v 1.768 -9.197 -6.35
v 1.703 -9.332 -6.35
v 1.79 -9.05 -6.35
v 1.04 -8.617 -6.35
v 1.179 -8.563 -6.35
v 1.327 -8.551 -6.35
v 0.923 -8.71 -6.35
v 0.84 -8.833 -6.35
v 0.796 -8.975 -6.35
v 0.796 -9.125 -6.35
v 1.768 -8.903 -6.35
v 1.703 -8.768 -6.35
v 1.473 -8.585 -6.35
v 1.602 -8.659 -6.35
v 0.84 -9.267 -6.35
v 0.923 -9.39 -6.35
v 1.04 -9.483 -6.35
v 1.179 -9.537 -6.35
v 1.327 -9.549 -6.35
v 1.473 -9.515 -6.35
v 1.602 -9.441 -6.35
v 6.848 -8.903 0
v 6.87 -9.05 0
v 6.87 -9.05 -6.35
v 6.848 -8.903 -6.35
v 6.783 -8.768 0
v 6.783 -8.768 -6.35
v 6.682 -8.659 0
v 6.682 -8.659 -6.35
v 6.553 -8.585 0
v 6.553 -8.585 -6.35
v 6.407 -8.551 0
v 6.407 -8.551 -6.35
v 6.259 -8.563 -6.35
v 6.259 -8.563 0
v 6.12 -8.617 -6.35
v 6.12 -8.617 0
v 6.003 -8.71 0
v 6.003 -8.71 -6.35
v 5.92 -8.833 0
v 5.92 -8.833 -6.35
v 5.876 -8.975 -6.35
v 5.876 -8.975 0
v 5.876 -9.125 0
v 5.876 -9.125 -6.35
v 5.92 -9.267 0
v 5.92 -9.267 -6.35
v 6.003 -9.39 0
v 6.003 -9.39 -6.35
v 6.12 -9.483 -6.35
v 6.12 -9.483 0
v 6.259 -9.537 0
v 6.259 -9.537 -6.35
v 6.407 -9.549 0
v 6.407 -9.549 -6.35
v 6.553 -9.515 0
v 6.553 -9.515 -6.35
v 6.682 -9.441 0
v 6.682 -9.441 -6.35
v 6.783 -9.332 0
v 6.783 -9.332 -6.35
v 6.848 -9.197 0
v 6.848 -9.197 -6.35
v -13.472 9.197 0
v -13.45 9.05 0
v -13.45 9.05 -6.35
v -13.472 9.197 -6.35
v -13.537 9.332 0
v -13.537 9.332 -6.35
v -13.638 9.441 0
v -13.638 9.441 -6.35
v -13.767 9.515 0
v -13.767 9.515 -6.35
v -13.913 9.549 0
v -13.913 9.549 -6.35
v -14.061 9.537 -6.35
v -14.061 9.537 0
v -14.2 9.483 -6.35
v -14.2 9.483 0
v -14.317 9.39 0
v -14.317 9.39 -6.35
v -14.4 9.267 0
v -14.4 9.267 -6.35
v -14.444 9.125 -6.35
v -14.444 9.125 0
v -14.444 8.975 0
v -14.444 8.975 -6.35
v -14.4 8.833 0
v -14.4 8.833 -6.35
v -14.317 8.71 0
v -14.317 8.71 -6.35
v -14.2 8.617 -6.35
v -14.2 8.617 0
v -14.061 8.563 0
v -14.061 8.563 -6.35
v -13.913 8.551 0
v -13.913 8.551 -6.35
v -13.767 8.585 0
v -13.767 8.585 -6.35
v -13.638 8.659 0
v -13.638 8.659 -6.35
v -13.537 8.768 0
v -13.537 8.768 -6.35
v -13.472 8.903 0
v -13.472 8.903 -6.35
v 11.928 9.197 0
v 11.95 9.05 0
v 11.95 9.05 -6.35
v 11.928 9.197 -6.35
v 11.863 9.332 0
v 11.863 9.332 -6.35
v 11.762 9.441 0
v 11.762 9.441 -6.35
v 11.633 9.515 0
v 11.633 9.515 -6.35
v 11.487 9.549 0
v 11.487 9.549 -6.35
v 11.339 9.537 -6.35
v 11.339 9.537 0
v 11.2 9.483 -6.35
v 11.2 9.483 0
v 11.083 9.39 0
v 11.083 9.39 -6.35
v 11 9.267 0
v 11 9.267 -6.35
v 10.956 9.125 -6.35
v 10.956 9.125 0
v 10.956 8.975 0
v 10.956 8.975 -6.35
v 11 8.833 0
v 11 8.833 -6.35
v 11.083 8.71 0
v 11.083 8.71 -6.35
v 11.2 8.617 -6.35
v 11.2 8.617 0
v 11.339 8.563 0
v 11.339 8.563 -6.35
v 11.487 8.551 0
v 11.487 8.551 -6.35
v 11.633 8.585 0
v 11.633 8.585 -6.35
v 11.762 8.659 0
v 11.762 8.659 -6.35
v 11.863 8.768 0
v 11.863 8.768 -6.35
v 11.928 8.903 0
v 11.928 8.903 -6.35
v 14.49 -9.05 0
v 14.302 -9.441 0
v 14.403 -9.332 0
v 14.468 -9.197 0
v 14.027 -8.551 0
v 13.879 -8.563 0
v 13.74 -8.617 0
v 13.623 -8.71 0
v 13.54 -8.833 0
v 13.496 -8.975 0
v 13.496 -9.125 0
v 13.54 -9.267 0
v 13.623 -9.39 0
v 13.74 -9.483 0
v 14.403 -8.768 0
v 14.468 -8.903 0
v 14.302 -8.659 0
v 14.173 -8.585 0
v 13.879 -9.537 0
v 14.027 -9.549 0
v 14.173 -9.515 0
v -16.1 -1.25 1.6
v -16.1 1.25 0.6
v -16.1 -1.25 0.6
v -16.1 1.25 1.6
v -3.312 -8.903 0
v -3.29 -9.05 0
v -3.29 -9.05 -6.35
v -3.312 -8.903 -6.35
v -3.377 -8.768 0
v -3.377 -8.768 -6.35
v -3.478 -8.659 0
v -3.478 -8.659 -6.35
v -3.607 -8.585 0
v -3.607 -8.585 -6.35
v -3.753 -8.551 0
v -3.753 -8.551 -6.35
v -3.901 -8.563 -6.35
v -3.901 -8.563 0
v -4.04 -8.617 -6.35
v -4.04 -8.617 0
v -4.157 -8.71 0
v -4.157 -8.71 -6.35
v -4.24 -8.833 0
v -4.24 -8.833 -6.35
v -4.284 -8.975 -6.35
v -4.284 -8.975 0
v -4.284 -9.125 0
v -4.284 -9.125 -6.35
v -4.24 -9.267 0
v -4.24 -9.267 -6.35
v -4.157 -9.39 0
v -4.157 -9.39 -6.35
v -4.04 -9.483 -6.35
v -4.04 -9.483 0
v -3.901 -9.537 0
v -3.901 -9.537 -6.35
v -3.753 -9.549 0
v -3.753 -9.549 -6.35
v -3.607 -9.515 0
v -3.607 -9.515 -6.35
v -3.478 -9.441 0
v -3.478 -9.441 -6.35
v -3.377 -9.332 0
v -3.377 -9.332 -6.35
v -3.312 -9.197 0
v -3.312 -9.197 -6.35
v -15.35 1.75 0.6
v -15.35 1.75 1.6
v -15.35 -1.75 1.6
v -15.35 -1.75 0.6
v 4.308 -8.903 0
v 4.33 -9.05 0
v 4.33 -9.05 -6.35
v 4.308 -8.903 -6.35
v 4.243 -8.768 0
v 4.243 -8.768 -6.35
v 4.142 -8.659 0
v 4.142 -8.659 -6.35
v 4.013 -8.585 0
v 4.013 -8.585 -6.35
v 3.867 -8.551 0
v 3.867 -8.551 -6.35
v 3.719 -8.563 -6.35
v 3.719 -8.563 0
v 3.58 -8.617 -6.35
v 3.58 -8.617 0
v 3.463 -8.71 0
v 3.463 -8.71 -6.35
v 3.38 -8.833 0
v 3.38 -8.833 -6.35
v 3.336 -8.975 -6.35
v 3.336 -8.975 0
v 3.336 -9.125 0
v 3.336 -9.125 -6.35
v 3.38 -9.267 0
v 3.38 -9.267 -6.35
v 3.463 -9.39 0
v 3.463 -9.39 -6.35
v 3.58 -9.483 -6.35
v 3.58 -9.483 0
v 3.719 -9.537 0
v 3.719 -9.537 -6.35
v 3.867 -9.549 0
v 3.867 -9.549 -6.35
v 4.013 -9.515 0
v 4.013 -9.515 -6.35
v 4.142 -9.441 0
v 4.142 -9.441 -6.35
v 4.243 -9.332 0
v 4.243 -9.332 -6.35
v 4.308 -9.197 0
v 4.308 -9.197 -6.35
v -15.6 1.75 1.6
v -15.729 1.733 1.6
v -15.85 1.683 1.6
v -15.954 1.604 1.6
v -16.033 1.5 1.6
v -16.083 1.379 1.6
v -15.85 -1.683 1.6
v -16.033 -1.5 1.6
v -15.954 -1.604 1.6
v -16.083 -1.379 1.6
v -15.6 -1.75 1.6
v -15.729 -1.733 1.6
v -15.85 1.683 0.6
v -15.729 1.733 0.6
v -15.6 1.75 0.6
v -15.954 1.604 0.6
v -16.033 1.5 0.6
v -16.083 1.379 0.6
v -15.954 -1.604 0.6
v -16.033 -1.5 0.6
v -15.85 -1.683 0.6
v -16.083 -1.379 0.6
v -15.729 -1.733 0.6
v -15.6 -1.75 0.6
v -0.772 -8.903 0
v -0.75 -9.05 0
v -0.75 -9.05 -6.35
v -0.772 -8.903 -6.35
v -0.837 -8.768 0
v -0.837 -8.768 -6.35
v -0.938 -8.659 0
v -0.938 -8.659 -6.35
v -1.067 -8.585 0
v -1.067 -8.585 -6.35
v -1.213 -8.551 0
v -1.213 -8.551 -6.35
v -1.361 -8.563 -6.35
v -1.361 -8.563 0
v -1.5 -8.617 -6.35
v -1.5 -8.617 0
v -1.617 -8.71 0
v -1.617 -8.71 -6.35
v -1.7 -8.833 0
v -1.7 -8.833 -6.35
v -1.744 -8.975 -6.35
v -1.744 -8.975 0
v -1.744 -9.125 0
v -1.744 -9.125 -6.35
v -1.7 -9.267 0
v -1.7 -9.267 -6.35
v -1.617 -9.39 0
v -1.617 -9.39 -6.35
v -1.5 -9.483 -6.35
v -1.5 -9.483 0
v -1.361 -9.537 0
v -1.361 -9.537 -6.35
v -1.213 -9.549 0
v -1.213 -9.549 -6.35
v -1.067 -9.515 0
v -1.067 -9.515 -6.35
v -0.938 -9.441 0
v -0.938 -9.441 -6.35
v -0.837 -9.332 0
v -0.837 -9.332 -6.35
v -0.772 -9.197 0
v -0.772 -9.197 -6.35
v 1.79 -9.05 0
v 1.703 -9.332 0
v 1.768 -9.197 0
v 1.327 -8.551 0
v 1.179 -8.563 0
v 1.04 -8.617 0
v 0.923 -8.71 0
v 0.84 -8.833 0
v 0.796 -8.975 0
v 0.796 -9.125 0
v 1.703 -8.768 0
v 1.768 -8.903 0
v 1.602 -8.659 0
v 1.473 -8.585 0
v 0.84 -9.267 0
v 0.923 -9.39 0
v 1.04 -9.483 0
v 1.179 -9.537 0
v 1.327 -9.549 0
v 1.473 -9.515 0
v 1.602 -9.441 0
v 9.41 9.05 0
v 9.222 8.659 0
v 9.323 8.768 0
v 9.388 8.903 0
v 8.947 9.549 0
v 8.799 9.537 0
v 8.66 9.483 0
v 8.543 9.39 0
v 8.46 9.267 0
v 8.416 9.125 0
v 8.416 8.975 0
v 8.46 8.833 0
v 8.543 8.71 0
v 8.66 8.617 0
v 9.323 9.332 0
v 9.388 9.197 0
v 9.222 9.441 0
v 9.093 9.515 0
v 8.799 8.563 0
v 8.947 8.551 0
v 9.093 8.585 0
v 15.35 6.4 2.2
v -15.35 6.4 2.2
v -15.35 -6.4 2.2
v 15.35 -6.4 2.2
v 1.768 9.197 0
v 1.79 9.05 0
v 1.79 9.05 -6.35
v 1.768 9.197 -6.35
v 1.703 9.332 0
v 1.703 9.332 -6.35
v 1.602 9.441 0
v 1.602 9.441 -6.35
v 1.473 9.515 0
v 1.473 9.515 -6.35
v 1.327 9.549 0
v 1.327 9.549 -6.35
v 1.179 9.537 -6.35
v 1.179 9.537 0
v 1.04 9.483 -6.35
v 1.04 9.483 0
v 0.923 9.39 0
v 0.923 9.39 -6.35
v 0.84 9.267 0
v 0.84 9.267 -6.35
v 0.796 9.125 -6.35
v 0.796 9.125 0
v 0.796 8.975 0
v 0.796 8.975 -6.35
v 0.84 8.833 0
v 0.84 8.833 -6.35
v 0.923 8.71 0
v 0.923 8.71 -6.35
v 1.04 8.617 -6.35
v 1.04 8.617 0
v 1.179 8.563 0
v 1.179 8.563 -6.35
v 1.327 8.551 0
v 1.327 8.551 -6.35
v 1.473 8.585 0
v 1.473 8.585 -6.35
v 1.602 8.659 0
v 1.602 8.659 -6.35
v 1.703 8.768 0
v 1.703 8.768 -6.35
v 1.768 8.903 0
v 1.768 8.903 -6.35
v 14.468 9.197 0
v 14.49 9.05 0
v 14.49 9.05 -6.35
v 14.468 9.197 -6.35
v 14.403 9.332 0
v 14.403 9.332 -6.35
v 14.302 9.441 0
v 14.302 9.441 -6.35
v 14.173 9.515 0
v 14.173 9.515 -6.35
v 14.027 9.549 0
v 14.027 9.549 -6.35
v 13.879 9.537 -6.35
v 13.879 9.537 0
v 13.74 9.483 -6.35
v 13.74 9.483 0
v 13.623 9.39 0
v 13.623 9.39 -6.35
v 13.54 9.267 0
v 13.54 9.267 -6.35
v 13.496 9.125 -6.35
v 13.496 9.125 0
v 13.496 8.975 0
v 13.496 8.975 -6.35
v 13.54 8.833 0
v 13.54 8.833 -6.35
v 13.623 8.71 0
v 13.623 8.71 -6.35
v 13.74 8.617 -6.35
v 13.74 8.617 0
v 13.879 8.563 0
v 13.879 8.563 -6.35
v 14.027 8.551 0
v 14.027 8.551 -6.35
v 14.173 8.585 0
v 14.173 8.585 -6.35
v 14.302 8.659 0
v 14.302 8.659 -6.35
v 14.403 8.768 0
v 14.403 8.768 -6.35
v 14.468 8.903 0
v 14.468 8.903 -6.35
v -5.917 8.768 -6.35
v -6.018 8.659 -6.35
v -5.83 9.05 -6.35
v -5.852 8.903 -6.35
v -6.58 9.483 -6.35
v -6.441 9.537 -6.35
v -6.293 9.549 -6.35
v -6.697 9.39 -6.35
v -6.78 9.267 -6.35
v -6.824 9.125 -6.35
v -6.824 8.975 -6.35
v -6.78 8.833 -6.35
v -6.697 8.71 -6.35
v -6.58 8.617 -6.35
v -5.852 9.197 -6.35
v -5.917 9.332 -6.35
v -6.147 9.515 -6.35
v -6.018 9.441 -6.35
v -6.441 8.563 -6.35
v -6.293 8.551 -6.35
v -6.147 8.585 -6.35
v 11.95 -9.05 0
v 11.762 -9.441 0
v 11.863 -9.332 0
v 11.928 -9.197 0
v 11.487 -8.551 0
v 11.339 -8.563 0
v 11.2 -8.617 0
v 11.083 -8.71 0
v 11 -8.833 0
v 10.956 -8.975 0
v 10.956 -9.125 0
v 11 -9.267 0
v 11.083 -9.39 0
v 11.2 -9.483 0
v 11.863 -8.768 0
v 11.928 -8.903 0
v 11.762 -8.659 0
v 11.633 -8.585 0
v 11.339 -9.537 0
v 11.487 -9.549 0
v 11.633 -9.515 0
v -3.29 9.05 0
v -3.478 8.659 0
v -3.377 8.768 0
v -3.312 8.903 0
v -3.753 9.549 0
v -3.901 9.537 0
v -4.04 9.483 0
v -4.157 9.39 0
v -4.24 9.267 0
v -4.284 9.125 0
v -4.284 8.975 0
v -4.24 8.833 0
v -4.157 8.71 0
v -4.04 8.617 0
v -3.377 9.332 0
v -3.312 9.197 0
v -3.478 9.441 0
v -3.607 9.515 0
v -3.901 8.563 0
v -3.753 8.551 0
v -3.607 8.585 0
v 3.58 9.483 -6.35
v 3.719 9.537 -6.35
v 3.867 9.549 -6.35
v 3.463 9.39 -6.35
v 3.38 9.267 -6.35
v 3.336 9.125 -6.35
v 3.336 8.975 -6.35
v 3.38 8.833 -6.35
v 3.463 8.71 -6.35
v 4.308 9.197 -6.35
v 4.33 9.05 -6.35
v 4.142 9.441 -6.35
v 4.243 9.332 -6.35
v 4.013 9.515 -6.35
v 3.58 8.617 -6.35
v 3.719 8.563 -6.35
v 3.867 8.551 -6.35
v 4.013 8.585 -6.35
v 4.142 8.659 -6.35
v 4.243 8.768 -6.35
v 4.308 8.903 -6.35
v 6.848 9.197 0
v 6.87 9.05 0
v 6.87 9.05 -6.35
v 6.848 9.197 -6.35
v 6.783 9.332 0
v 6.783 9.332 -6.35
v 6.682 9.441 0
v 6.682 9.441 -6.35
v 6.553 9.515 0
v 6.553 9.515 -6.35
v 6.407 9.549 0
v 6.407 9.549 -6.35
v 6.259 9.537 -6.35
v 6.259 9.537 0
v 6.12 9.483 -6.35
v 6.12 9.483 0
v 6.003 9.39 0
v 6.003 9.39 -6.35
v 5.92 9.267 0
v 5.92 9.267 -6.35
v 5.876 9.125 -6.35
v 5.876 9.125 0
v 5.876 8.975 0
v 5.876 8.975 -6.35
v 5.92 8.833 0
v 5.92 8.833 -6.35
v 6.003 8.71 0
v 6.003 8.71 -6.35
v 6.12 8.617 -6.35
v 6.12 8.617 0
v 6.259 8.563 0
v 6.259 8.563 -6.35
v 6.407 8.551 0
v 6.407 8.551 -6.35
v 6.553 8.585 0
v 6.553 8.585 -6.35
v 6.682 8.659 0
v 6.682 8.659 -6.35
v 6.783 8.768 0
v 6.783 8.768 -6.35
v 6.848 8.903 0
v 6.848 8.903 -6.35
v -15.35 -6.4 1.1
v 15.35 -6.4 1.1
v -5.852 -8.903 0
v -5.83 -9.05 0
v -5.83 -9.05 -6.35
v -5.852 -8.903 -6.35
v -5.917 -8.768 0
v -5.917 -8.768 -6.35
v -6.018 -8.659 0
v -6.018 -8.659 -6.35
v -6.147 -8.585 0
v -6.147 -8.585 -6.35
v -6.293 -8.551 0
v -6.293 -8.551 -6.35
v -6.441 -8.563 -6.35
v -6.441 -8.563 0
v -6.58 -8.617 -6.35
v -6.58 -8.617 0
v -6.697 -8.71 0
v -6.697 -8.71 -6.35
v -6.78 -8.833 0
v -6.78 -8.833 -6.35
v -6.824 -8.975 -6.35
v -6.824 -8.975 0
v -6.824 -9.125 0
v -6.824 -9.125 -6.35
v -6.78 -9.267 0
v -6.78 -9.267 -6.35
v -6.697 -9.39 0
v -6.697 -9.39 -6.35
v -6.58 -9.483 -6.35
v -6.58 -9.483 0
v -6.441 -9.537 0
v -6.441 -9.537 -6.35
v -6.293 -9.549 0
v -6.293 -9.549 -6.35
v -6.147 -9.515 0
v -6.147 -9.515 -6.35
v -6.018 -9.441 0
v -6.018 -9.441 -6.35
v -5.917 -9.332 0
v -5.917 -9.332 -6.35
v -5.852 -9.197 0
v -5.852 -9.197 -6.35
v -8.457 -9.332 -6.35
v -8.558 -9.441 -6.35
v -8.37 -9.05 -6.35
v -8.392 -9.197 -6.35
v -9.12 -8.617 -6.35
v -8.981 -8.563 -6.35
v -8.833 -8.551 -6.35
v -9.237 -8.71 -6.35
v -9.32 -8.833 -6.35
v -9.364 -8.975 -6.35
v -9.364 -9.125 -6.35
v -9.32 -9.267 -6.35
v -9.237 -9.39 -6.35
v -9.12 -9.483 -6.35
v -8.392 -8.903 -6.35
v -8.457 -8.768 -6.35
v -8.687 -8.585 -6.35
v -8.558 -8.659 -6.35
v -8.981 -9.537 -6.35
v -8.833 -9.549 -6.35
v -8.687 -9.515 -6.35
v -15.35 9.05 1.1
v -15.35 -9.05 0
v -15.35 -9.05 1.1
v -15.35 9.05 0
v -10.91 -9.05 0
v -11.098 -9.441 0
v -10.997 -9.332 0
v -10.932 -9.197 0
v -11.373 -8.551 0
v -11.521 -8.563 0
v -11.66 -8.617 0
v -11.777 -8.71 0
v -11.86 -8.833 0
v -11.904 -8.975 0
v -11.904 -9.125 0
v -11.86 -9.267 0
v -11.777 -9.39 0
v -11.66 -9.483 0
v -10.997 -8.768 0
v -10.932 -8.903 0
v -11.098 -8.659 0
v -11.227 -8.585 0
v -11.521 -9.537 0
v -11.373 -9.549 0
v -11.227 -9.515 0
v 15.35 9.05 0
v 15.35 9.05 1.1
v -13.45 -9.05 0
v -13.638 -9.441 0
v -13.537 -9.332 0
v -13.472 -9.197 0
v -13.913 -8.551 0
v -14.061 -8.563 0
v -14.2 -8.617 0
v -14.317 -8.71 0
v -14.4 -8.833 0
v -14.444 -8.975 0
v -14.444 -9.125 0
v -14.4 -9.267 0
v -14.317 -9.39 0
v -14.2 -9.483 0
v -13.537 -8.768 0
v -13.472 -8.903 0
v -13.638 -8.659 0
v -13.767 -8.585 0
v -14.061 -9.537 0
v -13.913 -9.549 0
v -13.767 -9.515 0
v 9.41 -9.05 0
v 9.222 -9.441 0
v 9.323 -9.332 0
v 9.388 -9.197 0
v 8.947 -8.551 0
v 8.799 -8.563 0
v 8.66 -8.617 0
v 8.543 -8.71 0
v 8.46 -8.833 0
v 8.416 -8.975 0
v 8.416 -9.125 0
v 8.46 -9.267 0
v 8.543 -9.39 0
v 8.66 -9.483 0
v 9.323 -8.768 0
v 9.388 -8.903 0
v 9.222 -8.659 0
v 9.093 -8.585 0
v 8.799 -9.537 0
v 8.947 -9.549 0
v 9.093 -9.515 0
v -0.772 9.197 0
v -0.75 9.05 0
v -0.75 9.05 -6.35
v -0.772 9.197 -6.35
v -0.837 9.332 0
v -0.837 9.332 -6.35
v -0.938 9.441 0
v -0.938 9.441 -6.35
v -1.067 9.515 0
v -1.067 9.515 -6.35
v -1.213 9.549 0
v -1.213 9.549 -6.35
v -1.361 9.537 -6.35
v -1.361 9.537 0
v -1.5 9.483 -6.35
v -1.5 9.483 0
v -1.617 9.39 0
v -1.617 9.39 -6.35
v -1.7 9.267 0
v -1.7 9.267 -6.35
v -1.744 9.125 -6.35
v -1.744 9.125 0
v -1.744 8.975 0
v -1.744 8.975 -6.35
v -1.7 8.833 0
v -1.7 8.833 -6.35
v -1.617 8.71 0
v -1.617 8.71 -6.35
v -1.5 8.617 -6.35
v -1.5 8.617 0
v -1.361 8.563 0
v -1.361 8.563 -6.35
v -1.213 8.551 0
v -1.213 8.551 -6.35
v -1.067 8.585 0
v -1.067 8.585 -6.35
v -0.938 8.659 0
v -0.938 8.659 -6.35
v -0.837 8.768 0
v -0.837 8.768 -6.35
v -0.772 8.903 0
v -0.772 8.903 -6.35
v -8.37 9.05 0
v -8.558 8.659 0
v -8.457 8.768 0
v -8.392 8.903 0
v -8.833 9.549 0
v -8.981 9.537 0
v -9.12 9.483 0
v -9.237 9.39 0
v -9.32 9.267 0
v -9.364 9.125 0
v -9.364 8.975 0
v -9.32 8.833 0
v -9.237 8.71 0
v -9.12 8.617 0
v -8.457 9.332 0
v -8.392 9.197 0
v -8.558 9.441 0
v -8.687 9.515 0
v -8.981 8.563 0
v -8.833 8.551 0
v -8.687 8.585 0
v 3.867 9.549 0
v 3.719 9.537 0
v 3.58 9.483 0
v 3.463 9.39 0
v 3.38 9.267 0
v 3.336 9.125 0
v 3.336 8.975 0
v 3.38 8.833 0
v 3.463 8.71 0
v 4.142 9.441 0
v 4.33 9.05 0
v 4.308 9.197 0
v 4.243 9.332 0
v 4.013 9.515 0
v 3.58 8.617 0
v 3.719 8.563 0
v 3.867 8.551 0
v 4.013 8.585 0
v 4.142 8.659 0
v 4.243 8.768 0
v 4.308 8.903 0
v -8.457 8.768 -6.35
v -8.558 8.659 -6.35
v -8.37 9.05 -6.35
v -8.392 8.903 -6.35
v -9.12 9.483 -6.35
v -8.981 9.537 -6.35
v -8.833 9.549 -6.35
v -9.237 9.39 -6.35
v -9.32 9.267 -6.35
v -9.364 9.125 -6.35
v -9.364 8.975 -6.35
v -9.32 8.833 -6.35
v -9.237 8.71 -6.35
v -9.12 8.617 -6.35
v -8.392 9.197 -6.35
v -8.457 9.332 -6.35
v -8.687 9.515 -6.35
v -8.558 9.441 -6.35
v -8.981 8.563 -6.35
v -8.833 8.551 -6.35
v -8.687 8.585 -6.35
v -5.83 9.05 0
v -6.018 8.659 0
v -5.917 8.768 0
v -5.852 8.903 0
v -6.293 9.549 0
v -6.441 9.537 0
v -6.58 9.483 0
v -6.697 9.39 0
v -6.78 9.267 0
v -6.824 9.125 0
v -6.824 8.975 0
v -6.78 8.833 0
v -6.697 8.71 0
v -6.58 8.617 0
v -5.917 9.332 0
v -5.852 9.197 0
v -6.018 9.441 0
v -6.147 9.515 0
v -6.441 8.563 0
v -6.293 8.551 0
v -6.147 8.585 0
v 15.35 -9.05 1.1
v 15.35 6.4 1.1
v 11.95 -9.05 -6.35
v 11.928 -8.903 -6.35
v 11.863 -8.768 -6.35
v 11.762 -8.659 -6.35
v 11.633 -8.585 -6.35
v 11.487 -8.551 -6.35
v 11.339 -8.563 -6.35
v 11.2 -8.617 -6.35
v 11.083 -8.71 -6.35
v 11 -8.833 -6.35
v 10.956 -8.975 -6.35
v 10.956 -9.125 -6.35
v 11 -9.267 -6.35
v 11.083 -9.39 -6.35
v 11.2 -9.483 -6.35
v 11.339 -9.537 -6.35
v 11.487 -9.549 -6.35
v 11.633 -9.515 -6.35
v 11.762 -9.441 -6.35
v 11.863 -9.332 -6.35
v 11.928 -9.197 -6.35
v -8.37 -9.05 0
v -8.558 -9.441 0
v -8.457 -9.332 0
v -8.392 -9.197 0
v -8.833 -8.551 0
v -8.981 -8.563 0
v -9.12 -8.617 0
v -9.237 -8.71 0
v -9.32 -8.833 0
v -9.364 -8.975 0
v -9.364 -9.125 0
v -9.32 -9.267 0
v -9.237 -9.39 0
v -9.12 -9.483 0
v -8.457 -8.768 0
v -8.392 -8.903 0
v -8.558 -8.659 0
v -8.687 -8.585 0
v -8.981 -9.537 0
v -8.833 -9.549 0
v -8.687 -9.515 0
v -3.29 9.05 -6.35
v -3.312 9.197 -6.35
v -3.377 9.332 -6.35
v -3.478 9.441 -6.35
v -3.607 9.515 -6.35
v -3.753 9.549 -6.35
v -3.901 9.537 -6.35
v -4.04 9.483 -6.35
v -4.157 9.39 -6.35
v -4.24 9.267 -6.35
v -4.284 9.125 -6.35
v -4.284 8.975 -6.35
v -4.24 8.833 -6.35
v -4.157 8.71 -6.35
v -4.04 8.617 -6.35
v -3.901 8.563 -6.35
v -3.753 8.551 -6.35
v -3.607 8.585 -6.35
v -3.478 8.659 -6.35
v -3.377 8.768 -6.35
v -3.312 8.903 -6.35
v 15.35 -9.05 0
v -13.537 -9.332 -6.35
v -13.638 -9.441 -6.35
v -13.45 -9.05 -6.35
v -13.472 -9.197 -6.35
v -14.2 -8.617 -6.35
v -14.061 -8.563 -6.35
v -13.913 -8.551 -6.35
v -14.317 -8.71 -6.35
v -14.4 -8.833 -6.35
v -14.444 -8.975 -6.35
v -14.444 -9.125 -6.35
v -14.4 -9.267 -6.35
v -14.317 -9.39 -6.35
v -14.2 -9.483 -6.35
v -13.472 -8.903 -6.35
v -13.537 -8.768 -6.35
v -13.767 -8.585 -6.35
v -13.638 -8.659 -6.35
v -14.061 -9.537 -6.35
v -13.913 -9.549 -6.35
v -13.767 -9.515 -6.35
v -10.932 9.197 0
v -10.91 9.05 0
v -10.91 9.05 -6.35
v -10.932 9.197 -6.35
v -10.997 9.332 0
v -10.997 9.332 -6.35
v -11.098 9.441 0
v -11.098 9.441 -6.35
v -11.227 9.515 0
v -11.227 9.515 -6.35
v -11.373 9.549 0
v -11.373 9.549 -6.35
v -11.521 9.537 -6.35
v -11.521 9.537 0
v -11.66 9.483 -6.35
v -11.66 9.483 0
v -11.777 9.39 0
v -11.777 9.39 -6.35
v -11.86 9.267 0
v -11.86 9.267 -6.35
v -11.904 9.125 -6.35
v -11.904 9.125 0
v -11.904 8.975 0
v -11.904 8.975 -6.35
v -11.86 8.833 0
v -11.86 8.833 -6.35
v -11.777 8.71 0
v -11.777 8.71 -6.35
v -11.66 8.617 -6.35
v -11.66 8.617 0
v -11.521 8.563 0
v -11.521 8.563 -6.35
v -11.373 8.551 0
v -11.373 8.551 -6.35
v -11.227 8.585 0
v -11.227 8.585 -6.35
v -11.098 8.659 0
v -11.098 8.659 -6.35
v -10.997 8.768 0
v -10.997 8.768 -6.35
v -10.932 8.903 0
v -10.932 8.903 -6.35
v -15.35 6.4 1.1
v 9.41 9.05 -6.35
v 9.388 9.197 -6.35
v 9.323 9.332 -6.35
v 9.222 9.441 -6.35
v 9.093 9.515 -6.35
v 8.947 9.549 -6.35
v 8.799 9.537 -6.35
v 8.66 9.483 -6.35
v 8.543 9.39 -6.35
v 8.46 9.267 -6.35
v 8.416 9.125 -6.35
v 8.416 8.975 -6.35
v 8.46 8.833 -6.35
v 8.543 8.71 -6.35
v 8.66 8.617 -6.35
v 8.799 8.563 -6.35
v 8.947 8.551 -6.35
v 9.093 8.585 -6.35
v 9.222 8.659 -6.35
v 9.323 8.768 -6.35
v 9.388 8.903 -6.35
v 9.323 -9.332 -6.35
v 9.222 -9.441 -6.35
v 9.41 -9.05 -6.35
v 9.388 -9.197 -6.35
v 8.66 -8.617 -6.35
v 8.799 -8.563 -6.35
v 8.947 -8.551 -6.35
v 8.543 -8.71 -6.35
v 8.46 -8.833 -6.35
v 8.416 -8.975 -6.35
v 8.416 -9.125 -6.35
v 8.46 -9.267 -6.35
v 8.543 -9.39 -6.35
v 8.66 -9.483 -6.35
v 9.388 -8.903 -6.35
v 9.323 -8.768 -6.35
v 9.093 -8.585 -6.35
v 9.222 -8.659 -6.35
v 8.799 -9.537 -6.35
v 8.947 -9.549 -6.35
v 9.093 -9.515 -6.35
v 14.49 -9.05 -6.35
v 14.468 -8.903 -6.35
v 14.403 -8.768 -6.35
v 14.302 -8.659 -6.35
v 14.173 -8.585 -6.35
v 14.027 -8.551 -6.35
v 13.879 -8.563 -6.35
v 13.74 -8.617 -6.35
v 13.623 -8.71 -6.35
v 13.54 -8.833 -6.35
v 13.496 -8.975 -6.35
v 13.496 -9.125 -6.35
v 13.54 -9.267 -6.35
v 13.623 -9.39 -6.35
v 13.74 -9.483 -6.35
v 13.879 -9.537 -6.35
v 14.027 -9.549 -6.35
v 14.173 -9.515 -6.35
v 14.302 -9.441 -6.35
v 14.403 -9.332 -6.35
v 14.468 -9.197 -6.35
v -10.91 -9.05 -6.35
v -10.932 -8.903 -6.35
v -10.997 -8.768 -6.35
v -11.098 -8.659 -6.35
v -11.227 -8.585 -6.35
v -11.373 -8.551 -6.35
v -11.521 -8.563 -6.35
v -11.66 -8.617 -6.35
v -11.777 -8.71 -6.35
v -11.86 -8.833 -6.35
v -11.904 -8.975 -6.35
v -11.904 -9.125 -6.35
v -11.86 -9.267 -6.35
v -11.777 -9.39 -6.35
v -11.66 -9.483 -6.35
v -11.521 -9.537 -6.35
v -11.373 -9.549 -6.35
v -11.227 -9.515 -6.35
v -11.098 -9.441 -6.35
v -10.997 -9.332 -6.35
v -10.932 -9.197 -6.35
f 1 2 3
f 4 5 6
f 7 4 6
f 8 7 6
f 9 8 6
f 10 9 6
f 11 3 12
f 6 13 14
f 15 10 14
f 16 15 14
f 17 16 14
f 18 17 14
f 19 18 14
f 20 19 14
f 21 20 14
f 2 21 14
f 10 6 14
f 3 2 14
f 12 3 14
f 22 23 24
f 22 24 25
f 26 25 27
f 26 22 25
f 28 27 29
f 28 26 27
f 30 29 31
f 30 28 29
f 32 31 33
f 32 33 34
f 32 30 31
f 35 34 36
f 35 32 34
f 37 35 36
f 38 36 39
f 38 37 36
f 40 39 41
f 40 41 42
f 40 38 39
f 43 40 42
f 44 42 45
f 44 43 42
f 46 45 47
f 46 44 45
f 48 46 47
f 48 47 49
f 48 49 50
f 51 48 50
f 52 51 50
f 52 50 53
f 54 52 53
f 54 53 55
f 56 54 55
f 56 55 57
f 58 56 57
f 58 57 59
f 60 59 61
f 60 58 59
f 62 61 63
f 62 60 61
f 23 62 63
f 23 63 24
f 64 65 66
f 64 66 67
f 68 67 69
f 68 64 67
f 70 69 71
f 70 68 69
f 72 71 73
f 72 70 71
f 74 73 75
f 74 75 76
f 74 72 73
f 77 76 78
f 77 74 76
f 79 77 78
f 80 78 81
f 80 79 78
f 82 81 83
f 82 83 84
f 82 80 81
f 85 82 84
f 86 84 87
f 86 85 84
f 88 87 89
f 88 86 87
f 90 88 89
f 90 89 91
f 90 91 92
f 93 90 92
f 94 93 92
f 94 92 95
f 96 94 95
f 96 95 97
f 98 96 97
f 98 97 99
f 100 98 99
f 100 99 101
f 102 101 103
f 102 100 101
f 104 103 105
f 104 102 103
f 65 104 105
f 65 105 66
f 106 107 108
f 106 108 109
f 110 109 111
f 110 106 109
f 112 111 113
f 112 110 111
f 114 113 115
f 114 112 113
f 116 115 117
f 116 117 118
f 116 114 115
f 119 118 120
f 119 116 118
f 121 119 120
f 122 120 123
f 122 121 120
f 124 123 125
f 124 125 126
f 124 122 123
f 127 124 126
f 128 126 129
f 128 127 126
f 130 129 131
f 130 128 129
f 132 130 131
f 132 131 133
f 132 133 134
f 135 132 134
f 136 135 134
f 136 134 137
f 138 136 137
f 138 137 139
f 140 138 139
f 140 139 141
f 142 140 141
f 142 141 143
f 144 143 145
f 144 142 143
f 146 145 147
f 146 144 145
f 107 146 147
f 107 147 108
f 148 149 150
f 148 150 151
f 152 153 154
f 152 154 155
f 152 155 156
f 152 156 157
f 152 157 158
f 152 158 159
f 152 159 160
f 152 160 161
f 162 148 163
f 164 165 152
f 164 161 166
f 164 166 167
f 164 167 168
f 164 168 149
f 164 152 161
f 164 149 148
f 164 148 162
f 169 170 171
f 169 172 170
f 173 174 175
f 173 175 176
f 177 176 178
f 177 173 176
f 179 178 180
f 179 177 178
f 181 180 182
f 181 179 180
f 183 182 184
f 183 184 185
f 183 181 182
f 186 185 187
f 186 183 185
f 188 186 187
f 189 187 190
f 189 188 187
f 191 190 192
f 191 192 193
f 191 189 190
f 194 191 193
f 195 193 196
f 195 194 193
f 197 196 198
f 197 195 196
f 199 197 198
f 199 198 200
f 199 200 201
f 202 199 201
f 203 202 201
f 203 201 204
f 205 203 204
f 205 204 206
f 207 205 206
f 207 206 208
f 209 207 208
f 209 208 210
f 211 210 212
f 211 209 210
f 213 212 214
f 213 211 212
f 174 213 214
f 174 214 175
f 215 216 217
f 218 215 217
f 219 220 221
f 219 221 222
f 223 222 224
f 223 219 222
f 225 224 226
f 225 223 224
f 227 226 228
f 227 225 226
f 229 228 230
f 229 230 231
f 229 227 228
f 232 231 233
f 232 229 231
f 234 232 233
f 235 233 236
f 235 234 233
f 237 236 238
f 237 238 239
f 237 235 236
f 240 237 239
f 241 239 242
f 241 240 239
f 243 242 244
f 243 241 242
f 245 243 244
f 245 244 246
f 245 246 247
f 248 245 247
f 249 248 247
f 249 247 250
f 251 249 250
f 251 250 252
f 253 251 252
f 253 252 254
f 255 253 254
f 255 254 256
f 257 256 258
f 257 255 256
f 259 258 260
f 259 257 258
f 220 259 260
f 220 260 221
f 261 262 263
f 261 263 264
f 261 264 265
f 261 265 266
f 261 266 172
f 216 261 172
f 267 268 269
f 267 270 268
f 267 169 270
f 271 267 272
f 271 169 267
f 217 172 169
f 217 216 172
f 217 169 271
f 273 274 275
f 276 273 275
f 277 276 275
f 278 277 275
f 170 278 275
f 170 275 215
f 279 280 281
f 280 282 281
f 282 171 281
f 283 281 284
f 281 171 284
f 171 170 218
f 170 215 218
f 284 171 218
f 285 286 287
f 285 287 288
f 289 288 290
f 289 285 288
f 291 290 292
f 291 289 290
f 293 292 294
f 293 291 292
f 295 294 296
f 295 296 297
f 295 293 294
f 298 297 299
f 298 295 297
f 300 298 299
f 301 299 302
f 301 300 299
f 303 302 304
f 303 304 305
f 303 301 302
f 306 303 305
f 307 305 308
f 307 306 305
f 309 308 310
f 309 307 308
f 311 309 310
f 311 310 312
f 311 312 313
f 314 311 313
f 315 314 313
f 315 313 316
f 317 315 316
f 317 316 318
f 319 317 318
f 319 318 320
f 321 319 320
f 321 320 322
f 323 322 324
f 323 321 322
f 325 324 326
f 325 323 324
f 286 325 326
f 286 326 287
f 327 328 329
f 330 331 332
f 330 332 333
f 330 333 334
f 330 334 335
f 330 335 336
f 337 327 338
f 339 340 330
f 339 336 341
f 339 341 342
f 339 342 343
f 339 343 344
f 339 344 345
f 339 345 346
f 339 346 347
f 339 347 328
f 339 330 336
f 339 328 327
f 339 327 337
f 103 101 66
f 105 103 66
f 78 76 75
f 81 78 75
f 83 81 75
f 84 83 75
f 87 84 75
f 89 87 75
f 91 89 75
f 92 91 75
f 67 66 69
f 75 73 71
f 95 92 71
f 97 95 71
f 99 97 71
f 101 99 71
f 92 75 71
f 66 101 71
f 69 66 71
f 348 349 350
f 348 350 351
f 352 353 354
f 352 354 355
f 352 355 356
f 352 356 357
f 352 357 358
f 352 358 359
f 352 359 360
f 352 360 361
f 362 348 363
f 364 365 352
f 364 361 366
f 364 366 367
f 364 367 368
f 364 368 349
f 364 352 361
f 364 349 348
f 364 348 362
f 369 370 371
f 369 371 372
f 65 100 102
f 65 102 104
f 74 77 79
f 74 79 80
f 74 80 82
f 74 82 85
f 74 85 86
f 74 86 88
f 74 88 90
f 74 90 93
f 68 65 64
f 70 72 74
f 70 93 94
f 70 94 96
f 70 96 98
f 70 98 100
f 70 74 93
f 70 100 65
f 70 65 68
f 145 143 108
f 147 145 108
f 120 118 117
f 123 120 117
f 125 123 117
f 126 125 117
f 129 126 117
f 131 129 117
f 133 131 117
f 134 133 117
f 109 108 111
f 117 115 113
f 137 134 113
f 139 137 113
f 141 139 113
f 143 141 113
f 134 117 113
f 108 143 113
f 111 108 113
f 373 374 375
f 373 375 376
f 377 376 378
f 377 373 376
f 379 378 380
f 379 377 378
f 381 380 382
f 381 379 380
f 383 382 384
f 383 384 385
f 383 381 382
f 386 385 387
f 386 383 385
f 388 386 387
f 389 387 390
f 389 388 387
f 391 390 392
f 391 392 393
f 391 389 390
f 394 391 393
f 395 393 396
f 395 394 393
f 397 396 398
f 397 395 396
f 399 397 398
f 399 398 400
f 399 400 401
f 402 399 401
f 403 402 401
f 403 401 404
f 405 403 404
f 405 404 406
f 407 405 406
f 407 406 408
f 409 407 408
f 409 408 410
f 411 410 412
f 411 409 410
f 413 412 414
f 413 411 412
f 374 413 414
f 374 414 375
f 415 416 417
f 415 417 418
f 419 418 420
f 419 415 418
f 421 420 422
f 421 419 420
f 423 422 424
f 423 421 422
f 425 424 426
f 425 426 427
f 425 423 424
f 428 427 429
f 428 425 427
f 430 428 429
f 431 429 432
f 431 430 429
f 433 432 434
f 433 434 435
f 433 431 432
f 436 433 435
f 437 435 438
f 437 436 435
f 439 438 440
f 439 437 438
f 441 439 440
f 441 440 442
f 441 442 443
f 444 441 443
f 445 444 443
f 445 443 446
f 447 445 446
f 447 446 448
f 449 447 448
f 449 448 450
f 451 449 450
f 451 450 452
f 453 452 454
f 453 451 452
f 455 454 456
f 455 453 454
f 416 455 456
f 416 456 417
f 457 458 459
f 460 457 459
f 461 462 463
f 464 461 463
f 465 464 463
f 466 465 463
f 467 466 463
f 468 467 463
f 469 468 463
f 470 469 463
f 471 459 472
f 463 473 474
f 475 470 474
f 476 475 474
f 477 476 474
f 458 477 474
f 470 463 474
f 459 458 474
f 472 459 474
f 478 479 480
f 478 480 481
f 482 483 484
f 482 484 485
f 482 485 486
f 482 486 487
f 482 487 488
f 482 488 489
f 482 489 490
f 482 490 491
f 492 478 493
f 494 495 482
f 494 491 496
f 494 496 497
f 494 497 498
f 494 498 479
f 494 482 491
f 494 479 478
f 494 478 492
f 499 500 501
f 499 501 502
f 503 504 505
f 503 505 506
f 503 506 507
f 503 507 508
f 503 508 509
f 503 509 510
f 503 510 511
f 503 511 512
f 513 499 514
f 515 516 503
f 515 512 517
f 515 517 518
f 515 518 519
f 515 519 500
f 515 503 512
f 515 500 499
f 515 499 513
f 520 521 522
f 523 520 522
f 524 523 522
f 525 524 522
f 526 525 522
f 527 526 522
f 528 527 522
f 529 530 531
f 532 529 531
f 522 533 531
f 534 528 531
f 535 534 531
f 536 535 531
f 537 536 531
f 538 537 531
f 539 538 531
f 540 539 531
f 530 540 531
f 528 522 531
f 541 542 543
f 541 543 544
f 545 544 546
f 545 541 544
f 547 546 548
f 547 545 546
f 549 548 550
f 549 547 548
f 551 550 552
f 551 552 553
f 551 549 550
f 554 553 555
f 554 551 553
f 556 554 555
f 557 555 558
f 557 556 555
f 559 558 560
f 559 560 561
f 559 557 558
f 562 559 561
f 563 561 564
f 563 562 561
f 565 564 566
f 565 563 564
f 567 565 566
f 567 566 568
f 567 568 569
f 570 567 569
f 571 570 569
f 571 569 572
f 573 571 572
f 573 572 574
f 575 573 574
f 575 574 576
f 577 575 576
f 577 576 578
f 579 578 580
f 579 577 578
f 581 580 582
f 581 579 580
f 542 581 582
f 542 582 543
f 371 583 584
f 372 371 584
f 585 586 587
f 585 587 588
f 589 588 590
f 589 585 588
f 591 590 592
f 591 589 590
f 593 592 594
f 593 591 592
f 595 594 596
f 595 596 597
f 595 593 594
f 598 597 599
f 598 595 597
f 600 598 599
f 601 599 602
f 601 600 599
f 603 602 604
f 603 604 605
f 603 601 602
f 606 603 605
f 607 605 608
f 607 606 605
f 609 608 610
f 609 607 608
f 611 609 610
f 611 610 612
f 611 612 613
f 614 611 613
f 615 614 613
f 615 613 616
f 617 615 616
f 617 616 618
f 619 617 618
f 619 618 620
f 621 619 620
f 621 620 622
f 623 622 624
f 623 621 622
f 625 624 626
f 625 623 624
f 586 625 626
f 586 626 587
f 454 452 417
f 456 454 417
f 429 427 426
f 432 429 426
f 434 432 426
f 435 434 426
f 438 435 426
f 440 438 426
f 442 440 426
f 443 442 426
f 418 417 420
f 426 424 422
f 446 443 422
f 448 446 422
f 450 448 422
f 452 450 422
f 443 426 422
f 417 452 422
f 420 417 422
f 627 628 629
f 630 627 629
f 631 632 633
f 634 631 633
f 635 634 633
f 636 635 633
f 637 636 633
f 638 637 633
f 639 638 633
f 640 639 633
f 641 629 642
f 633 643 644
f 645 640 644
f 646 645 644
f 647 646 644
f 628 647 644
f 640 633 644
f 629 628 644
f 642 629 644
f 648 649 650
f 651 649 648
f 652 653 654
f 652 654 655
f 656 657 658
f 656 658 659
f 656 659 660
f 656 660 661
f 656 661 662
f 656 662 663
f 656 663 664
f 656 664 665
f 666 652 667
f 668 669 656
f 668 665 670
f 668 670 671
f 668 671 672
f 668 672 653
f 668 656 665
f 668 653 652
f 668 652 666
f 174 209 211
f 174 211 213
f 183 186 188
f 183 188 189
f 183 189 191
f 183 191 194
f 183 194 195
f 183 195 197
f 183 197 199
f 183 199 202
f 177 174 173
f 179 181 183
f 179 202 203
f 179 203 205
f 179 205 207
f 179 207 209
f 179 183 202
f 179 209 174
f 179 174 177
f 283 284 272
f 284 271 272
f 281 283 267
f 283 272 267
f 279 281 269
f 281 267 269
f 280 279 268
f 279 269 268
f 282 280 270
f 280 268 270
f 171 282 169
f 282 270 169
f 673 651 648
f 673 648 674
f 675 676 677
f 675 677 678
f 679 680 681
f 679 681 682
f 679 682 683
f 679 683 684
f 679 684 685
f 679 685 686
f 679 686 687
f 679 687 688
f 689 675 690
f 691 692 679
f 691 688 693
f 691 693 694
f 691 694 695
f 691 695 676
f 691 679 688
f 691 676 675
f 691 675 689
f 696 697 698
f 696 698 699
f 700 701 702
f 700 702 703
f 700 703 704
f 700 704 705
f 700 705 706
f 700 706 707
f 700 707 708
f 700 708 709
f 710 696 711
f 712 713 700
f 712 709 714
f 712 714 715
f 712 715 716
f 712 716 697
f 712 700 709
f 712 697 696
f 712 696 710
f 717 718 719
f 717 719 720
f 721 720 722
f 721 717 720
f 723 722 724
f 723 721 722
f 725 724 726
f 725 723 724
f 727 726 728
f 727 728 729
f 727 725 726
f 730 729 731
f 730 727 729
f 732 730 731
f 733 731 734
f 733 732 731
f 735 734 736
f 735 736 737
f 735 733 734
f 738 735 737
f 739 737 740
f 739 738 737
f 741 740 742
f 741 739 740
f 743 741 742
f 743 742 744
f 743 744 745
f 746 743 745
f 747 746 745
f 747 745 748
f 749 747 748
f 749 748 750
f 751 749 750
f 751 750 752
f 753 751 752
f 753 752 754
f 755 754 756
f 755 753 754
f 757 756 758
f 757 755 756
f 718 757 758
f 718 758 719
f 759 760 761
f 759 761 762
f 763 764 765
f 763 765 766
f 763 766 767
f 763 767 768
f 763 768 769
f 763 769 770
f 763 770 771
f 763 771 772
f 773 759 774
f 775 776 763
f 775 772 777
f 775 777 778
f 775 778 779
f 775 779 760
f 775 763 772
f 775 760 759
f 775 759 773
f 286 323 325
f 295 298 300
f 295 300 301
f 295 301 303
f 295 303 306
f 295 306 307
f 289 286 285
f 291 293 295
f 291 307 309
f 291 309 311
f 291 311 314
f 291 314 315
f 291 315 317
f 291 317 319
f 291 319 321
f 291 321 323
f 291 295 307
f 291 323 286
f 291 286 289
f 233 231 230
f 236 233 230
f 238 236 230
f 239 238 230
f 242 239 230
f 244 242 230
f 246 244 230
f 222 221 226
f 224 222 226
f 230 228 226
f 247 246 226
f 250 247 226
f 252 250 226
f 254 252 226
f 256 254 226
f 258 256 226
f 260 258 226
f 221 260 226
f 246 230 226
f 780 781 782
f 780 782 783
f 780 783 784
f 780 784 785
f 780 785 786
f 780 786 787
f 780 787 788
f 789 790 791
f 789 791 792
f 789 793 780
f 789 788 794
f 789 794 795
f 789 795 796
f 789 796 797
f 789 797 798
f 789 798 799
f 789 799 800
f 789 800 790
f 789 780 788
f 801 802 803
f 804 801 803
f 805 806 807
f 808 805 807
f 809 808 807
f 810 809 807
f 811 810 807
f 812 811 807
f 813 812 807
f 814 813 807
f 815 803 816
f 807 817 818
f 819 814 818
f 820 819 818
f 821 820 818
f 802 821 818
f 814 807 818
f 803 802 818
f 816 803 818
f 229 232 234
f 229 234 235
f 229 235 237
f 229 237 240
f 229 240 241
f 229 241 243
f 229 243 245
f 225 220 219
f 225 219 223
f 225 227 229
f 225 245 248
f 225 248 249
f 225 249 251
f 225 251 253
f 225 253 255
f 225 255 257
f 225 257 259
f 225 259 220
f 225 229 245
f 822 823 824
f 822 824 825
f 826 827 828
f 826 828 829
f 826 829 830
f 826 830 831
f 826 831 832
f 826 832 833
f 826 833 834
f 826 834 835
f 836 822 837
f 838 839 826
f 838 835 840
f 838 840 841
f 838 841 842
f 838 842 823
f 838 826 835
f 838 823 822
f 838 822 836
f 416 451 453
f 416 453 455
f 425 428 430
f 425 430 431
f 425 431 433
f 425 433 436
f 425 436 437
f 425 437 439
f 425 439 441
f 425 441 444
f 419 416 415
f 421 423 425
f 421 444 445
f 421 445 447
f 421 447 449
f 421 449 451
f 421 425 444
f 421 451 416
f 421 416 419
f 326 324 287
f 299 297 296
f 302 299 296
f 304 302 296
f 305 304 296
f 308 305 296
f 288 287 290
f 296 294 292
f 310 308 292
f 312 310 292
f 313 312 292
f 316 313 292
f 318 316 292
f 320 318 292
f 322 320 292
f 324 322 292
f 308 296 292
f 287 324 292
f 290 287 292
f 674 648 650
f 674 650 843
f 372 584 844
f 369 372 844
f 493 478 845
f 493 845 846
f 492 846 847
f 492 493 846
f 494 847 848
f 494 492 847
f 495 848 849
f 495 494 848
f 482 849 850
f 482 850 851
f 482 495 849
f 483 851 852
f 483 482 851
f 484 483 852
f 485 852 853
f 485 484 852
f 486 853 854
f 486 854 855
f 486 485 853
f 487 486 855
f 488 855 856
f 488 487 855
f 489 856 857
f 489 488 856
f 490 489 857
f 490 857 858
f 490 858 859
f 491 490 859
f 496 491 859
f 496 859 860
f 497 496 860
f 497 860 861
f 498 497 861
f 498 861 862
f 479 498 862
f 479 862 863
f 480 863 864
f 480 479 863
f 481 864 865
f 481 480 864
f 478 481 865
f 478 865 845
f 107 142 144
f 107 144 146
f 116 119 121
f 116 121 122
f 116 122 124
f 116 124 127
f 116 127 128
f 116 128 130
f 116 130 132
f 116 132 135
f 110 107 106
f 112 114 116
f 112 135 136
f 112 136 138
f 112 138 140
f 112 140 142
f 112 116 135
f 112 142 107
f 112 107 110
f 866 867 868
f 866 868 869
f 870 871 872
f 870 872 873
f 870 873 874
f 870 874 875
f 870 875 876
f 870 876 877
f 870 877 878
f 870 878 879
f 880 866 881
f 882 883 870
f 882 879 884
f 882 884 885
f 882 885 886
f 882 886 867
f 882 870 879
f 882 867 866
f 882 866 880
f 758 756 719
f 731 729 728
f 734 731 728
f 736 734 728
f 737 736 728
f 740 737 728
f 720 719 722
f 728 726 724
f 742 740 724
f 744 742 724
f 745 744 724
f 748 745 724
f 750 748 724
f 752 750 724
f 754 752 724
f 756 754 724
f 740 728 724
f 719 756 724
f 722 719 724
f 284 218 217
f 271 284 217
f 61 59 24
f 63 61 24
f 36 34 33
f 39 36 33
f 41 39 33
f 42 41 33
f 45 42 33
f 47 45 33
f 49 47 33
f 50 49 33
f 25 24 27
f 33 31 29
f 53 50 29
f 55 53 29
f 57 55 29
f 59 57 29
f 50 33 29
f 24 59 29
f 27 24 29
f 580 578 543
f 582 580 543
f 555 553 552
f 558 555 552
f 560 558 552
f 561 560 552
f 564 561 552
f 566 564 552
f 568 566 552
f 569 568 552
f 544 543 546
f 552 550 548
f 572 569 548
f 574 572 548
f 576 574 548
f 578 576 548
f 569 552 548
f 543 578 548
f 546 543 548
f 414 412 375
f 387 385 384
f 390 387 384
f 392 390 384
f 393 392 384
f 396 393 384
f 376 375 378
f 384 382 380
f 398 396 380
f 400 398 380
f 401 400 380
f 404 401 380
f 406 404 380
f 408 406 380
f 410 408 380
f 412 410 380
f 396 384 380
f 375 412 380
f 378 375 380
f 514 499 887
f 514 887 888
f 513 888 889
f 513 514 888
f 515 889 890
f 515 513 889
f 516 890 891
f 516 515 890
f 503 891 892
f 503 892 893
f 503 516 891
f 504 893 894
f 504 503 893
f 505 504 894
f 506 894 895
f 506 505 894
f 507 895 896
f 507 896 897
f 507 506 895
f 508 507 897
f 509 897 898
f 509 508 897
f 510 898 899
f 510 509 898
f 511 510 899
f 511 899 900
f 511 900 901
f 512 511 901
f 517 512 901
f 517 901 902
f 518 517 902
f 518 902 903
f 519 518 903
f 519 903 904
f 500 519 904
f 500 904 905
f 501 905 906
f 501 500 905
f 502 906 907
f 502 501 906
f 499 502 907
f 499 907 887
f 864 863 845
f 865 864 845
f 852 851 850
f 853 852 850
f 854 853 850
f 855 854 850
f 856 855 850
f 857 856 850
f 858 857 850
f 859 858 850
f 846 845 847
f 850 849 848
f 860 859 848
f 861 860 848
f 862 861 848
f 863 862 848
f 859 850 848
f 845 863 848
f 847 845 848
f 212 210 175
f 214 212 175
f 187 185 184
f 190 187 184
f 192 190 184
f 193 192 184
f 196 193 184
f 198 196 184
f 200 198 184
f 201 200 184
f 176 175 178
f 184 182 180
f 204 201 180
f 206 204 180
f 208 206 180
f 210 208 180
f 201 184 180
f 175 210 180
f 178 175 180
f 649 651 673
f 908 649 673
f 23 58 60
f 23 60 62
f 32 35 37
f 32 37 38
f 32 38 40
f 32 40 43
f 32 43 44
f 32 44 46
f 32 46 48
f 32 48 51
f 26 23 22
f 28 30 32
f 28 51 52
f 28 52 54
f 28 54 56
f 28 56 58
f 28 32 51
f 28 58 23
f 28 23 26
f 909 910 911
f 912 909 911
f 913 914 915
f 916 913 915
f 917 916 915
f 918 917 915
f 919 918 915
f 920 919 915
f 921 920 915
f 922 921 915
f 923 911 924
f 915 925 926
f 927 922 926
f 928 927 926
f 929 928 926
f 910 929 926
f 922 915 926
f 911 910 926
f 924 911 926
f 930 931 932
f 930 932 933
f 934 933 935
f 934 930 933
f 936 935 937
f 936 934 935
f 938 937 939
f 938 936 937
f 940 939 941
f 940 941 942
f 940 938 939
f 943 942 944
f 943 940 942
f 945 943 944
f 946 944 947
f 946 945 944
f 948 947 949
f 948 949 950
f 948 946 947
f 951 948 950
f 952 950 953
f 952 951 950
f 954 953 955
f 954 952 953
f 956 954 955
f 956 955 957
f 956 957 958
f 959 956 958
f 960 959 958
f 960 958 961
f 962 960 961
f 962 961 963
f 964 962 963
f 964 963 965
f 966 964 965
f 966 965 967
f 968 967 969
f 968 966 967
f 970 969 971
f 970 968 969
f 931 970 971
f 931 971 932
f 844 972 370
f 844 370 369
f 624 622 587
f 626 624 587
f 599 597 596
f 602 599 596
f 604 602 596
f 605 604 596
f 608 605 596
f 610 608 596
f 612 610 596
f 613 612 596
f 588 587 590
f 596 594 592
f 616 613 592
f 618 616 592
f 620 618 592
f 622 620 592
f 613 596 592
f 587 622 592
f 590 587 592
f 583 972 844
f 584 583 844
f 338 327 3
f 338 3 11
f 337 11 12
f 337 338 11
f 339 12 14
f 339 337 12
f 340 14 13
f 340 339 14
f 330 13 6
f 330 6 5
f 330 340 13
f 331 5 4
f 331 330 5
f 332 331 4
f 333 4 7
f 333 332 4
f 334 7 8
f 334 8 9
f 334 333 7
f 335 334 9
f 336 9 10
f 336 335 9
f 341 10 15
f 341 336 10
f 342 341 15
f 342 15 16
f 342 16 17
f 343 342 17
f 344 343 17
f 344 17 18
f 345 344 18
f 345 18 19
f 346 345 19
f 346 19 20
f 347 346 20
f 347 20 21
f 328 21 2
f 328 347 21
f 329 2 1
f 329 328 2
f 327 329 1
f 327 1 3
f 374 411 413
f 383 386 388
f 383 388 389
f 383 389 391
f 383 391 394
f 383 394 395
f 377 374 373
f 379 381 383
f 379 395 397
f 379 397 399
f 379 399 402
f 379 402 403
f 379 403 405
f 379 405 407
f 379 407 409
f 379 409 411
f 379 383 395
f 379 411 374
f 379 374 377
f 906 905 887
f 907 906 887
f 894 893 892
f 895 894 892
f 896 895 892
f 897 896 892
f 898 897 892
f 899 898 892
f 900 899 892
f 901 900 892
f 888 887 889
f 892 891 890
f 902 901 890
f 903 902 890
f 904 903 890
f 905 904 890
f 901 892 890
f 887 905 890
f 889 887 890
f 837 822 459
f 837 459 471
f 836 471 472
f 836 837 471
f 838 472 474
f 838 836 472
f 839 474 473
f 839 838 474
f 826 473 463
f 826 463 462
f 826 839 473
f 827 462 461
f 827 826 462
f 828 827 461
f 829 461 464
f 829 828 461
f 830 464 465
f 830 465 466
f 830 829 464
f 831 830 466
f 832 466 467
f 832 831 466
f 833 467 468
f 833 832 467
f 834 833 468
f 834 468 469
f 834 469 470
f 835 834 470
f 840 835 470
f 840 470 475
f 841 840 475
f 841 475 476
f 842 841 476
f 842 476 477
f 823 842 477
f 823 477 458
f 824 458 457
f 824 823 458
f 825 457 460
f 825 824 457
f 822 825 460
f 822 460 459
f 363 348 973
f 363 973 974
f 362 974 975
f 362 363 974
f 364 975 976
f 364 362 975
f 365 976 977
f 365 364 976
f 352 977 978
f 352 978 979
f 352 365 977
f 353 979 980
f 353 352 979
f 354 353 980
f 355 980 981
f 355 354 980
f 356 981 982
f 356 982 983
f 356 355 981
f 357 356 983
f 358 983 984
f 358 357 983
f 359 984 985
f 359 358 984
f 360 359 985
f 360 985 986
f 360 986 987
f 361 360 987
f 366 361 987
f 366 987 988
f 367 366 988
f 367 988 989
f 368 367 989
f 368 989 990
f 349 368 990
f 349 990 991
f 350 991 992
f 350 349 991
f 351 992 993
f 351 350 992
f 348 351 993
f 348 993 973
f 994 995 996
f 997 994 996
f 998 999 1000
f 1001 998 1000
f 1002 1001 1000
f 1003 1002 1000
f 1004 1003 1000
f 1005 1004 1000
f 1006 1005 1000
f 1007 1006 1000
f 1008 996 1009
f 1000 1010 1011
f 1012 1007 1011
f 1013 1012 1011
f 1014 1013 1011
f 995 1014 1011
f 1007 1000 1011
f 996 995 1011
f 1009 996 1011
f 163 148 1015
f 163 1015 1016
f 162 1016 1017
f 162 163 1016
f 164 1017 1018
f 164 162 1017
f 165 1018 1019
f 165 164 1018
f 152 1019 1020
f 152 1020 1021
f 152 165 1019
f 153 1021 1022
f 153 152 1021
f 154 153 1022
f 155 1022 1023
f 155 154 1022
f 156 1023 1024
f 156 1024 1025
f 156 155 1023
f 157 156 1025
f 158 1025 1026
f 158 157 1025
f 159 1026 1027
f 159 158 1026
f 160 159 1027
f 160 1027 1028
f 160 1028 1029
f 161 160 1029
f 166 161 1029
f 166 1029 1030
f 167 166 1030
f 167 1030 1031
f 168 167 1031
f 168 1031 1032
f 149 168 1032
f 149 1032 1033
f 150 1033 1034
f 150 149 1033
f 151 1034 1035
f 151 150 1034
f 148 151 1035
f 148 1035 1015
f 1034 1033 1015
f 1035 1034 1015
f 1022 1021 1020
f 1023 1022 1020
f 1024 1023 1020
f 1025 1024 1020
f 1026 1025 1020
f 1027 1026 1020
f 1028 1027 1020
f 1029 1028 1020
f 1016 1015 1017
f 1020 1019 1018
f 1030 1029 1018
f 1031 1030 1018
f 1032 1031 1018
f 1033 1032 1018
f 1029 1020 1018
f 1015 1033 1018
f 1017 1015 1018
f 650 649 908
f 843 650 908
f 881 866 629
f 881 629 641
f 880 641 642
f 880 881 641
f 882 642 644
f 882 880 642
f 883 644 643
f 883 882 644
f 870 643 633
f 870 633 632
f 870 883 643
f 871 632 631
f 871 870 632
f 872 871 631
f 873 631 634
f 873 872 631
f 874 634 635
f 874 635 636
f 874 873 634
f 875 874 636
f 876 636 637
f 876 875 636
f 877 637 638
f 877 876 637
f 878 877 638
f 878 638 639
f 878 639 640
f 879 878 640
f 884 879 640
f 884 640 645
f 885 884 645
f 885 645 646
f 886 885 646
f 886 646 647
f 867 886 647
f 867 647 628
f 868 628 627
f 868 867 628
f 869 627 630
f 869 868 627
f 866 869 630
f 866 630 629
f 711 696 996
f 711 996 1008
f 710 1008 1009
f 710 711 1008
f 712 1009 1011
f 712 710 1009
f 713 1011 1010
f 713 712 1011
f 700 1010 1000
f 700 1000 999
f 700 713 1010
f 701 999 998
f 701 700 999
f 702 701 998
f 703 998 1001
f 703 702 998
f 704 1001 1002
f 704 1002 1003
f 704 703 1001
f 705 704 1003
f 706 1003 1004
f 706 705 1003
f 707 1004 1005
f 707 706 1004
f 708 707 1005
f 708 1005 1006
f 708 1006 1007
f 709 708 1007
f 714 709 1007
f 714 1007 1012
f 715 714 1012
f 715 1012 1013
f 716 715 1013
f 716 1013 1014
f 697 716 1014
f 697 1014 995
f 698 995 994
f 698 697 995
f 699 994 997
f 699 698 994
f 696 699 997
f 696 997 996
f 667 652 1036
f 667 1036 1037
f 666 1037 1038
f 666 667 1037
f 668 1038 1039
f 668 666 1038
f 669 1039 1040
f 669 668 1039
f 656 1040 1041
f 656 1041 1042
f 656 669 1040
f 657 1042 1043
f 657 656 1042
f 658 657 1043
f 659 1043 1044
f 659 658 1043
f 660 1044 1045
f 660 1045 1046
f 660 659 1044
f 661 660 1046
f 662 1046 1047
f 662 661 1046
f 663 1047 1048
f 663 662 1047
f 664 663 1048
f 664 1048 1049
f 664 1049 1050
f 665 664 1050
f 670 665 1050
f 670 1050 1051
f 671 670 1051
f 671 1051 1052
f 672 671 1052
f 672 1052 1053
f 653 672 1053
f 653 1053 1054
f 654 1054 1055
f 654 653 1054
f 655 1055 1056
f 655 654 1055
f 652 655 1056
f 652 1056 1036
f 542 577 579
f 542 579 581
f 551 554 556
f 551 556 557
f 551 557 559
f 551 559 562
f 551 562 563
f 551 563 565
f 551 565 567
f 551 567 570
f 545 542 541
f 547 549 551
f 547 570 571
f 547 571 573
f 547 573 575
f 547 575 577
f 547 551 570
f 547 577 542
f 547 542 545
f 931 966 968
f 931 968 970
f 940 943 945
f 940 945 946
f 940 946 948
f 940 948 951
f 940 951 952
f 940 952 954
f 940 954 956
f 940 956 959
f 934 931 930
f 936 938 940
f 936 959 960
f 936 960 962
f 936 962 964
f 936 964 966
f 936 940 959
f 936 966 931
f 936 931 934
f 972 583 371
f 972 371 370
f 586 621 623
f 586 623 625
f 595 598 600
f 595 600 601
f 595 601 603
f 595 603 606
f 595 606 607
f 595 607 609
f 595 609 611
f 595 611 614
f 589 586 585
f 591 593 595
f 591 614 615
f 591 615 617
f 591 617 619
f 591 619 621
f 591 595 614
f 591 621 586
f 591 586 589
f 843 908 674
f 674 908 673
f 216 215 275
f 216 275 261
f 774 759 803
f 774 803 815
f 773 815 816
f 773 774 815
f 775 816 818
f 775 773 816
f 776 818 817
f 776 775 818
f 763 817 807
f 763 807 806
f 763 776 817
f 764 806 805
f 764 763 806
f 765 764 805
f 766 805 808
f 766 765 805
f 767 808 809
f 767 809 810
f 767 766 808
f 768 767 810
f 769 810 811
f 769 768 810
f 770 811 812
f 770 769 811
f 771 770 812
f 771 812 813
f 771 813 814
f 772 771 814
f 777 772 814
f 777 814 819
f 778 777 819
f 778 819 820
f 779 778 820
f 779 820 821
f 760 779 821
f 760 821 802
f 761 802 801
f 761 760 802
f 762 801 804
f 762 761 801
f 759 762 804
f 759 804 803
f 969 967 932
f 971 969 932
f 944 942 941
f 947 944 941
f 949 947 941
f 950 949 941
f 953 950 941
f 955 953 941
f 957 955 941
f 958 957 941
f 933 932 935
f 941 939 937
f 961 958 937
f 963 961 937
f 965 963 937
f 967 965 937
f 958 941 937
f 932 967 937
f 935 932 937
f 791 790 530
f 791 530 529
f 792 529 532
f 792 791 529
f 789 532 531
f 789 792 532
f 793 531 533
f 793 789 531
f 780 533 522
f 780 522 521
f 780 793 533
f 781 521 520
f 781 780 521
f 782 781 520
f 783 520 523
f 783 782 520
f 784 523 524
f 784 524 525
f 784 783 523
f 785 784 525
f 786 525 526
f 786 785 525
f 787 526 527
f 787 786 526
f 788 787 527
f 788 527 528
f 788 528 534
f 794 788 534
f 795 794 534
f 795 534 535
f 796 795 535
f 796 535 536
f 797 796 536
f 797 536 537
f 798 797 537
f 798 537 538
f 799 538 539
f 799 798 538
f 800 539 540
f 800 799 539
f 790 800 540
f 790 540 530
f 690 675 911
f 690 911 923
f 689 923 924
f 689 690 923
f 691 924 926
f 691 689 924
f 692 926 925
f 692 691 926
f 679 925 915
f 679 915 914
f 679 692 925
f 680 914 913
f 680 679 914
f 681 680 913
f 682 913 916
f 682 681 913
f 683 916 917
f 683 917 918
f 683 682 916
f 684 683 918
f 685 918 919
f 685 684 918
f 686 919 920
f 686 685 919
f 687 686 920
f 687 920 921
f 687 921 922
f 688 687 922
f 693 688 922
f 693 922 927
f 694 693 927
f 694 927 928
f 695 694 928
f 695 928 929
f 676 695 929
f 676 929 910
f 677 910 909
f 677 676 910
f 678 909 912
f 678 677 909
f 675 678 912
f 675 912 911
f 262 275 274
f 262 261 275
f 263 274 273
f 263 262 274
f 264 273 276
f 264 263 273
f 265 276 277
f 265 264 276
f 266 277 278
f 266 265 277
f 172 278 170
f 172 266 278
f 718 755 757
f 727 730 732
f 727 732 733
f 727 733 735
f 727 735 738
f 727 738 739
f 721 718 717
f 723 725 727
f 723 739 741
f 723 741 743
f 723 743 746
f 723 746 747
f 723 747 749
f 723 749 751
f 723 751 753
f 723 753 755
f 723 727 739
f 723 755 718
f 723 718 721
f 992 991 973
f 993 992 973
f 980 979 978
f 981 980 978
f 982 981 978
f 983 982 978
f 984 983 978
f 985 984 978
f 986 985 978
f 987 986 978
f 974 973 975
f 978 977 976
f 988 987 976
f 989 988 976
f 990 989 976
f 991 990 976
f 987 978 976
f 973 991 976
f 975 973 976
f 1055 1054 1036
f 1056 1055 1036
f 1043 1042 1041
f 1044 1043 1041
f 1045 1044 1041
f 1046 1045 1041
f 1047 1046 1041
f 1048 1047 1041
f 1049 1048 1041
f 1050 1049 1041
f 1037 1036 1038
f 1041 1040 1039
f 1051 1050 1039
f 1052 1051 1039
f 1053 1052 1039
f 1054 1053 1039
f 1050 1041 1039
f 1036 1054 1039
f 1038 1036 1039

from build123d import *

# Parameters (mm, degrees)
SKETCH_W         = 30.7
SKETCH_H         = 18.1
EXTRUDE_DEPTH    = 1.1
SKETCH001_W      = 30.7
SKETCH001_H      = 12.8
EXTRUDE002_DEPTH = 1.1
SKETCH002_W      = 3.5
SKETCH002_H      = 1
EXTRUDE004_DEPTH = 0.75
FILLET_R         = 0.5
SKETCH003_R      = 0.5
EXTRUDE005_DEPTH = 6.35


with BuildPart() as extrude_body:
    # Sketch → Extrude (new body)
    with BuildSketch(Plane.XY):
        Rectangle(SKETCH_W, SKETCH_H)
    extrude(amount=EXTRUDE_DEPTH)


with BuildPart() as extrude002:
    # Sketch001 (on Face6 of Extrude) → Extrude002 (new body)
    with BuildSketch(Plane.XY.offset(1.1)):
        Rectangle(SKETCH001_W, SKETCH001_H)
    extrude(amount=EXTRUDE002_DEPTH)


with BuildPart() as fillet_body:
    # Sketch002 (on Face4 of Extrude) → Extrude004 (new body)
    with BuildSketch(Plane(origin=(-15.35, 0, 0), x_dir=(0, -1, 0), z_dir=(-1, 0, 0))):
        with Locations((0, 1.1)):
            Rectangle(SKETCH002_W, SKETCH002_H)
    extrude(amount=EXTRUDE004_DEPTH)

    # Fillet
    fillet_edges = [fillet_body.edges().sort_by_distance(p)[0] for p in [
        (-16.1, -1.75, 1.1),
        (-16.1, 1.75, 1.1),
    ]]
    fillet(fillet_edges, radius=FILLET_R)


with BuildPart() as extrude005:
    # Sketch003 → Extrude005 (new body)
    with BuildSketch(Plane.XY):
        with Locations((-13.95, 9.05)):
            Circle(SKETCH003_R)
        with Locations((-11.41, 9.05)):
            Circle(SKETCH003_R)
        with Locations((-8.87, 9.05)):
            Circle(SKETCH003_R)
        with Locations((-6.33, 9.05)):
            Circle(SKETCH003_R)
        with Locations((-3.79, 9.05)):
            Circle(SKETCH003_R)
        with Locations((-1.25, 9.05)):
            Circle(SKETCH003_R)
        with Locations((1.29, 9.05)):
            Circle(SKETCH003_R)
        with Locations((3.83, 9.05)):
            Circle(SKETCH003_R)
        with Locations((6.37, 9.05)):
            Circle(SKETCH003_R)
        with Locations((8.91, 9.05)):
            Circle(SKETCH003_R)
        with Locations((11.45, 9.05)):
            Circle(SKETCH003_R)
        with Locations((13.99, 9.05)):
            Circle(SKETCH003_R)
        with Locations((-13.95, -9.05)):
            Circle(SKETCH003_R)
        with Locations((-11.41, -9.05)):
            Circle(SKETCH003_R)
        with Locations((-8.87, -9.05)):
            Circle(SKETCH003_R)
        with Locations((-6.33, -9.05)):
            Circle(SKETCH003_R)
        with Locations((-3.79, -9.05)):
            Circle(SKETCH003_R)
        with Locations((-1.25, -9.05)):
            Circle(SKETCH003_R)
        with Locations((1.29, -9.05)):
            Circle(SKETCH003_R)
        with Locations((3.83, -9.05)):
            Circle(SKETCH003_R)
        with Locations((6.37, -9.05)):
            Circle(SKETCH003_R)
        with Locations((8.91, -9.05)):
            Circle(SKETCH003_R)
        with Locations((11.45, -9.05)):
            Circle(SKETCH003_R)
        with Locations((13.99, -9.05)):
            Circle(SKETCH003_R)
    extrude(amount=-EXTRUDE005_DEPTH)


solid = Compound([extrude_body.part, extrude002.part, fillet_body.part, extrude005.part])
